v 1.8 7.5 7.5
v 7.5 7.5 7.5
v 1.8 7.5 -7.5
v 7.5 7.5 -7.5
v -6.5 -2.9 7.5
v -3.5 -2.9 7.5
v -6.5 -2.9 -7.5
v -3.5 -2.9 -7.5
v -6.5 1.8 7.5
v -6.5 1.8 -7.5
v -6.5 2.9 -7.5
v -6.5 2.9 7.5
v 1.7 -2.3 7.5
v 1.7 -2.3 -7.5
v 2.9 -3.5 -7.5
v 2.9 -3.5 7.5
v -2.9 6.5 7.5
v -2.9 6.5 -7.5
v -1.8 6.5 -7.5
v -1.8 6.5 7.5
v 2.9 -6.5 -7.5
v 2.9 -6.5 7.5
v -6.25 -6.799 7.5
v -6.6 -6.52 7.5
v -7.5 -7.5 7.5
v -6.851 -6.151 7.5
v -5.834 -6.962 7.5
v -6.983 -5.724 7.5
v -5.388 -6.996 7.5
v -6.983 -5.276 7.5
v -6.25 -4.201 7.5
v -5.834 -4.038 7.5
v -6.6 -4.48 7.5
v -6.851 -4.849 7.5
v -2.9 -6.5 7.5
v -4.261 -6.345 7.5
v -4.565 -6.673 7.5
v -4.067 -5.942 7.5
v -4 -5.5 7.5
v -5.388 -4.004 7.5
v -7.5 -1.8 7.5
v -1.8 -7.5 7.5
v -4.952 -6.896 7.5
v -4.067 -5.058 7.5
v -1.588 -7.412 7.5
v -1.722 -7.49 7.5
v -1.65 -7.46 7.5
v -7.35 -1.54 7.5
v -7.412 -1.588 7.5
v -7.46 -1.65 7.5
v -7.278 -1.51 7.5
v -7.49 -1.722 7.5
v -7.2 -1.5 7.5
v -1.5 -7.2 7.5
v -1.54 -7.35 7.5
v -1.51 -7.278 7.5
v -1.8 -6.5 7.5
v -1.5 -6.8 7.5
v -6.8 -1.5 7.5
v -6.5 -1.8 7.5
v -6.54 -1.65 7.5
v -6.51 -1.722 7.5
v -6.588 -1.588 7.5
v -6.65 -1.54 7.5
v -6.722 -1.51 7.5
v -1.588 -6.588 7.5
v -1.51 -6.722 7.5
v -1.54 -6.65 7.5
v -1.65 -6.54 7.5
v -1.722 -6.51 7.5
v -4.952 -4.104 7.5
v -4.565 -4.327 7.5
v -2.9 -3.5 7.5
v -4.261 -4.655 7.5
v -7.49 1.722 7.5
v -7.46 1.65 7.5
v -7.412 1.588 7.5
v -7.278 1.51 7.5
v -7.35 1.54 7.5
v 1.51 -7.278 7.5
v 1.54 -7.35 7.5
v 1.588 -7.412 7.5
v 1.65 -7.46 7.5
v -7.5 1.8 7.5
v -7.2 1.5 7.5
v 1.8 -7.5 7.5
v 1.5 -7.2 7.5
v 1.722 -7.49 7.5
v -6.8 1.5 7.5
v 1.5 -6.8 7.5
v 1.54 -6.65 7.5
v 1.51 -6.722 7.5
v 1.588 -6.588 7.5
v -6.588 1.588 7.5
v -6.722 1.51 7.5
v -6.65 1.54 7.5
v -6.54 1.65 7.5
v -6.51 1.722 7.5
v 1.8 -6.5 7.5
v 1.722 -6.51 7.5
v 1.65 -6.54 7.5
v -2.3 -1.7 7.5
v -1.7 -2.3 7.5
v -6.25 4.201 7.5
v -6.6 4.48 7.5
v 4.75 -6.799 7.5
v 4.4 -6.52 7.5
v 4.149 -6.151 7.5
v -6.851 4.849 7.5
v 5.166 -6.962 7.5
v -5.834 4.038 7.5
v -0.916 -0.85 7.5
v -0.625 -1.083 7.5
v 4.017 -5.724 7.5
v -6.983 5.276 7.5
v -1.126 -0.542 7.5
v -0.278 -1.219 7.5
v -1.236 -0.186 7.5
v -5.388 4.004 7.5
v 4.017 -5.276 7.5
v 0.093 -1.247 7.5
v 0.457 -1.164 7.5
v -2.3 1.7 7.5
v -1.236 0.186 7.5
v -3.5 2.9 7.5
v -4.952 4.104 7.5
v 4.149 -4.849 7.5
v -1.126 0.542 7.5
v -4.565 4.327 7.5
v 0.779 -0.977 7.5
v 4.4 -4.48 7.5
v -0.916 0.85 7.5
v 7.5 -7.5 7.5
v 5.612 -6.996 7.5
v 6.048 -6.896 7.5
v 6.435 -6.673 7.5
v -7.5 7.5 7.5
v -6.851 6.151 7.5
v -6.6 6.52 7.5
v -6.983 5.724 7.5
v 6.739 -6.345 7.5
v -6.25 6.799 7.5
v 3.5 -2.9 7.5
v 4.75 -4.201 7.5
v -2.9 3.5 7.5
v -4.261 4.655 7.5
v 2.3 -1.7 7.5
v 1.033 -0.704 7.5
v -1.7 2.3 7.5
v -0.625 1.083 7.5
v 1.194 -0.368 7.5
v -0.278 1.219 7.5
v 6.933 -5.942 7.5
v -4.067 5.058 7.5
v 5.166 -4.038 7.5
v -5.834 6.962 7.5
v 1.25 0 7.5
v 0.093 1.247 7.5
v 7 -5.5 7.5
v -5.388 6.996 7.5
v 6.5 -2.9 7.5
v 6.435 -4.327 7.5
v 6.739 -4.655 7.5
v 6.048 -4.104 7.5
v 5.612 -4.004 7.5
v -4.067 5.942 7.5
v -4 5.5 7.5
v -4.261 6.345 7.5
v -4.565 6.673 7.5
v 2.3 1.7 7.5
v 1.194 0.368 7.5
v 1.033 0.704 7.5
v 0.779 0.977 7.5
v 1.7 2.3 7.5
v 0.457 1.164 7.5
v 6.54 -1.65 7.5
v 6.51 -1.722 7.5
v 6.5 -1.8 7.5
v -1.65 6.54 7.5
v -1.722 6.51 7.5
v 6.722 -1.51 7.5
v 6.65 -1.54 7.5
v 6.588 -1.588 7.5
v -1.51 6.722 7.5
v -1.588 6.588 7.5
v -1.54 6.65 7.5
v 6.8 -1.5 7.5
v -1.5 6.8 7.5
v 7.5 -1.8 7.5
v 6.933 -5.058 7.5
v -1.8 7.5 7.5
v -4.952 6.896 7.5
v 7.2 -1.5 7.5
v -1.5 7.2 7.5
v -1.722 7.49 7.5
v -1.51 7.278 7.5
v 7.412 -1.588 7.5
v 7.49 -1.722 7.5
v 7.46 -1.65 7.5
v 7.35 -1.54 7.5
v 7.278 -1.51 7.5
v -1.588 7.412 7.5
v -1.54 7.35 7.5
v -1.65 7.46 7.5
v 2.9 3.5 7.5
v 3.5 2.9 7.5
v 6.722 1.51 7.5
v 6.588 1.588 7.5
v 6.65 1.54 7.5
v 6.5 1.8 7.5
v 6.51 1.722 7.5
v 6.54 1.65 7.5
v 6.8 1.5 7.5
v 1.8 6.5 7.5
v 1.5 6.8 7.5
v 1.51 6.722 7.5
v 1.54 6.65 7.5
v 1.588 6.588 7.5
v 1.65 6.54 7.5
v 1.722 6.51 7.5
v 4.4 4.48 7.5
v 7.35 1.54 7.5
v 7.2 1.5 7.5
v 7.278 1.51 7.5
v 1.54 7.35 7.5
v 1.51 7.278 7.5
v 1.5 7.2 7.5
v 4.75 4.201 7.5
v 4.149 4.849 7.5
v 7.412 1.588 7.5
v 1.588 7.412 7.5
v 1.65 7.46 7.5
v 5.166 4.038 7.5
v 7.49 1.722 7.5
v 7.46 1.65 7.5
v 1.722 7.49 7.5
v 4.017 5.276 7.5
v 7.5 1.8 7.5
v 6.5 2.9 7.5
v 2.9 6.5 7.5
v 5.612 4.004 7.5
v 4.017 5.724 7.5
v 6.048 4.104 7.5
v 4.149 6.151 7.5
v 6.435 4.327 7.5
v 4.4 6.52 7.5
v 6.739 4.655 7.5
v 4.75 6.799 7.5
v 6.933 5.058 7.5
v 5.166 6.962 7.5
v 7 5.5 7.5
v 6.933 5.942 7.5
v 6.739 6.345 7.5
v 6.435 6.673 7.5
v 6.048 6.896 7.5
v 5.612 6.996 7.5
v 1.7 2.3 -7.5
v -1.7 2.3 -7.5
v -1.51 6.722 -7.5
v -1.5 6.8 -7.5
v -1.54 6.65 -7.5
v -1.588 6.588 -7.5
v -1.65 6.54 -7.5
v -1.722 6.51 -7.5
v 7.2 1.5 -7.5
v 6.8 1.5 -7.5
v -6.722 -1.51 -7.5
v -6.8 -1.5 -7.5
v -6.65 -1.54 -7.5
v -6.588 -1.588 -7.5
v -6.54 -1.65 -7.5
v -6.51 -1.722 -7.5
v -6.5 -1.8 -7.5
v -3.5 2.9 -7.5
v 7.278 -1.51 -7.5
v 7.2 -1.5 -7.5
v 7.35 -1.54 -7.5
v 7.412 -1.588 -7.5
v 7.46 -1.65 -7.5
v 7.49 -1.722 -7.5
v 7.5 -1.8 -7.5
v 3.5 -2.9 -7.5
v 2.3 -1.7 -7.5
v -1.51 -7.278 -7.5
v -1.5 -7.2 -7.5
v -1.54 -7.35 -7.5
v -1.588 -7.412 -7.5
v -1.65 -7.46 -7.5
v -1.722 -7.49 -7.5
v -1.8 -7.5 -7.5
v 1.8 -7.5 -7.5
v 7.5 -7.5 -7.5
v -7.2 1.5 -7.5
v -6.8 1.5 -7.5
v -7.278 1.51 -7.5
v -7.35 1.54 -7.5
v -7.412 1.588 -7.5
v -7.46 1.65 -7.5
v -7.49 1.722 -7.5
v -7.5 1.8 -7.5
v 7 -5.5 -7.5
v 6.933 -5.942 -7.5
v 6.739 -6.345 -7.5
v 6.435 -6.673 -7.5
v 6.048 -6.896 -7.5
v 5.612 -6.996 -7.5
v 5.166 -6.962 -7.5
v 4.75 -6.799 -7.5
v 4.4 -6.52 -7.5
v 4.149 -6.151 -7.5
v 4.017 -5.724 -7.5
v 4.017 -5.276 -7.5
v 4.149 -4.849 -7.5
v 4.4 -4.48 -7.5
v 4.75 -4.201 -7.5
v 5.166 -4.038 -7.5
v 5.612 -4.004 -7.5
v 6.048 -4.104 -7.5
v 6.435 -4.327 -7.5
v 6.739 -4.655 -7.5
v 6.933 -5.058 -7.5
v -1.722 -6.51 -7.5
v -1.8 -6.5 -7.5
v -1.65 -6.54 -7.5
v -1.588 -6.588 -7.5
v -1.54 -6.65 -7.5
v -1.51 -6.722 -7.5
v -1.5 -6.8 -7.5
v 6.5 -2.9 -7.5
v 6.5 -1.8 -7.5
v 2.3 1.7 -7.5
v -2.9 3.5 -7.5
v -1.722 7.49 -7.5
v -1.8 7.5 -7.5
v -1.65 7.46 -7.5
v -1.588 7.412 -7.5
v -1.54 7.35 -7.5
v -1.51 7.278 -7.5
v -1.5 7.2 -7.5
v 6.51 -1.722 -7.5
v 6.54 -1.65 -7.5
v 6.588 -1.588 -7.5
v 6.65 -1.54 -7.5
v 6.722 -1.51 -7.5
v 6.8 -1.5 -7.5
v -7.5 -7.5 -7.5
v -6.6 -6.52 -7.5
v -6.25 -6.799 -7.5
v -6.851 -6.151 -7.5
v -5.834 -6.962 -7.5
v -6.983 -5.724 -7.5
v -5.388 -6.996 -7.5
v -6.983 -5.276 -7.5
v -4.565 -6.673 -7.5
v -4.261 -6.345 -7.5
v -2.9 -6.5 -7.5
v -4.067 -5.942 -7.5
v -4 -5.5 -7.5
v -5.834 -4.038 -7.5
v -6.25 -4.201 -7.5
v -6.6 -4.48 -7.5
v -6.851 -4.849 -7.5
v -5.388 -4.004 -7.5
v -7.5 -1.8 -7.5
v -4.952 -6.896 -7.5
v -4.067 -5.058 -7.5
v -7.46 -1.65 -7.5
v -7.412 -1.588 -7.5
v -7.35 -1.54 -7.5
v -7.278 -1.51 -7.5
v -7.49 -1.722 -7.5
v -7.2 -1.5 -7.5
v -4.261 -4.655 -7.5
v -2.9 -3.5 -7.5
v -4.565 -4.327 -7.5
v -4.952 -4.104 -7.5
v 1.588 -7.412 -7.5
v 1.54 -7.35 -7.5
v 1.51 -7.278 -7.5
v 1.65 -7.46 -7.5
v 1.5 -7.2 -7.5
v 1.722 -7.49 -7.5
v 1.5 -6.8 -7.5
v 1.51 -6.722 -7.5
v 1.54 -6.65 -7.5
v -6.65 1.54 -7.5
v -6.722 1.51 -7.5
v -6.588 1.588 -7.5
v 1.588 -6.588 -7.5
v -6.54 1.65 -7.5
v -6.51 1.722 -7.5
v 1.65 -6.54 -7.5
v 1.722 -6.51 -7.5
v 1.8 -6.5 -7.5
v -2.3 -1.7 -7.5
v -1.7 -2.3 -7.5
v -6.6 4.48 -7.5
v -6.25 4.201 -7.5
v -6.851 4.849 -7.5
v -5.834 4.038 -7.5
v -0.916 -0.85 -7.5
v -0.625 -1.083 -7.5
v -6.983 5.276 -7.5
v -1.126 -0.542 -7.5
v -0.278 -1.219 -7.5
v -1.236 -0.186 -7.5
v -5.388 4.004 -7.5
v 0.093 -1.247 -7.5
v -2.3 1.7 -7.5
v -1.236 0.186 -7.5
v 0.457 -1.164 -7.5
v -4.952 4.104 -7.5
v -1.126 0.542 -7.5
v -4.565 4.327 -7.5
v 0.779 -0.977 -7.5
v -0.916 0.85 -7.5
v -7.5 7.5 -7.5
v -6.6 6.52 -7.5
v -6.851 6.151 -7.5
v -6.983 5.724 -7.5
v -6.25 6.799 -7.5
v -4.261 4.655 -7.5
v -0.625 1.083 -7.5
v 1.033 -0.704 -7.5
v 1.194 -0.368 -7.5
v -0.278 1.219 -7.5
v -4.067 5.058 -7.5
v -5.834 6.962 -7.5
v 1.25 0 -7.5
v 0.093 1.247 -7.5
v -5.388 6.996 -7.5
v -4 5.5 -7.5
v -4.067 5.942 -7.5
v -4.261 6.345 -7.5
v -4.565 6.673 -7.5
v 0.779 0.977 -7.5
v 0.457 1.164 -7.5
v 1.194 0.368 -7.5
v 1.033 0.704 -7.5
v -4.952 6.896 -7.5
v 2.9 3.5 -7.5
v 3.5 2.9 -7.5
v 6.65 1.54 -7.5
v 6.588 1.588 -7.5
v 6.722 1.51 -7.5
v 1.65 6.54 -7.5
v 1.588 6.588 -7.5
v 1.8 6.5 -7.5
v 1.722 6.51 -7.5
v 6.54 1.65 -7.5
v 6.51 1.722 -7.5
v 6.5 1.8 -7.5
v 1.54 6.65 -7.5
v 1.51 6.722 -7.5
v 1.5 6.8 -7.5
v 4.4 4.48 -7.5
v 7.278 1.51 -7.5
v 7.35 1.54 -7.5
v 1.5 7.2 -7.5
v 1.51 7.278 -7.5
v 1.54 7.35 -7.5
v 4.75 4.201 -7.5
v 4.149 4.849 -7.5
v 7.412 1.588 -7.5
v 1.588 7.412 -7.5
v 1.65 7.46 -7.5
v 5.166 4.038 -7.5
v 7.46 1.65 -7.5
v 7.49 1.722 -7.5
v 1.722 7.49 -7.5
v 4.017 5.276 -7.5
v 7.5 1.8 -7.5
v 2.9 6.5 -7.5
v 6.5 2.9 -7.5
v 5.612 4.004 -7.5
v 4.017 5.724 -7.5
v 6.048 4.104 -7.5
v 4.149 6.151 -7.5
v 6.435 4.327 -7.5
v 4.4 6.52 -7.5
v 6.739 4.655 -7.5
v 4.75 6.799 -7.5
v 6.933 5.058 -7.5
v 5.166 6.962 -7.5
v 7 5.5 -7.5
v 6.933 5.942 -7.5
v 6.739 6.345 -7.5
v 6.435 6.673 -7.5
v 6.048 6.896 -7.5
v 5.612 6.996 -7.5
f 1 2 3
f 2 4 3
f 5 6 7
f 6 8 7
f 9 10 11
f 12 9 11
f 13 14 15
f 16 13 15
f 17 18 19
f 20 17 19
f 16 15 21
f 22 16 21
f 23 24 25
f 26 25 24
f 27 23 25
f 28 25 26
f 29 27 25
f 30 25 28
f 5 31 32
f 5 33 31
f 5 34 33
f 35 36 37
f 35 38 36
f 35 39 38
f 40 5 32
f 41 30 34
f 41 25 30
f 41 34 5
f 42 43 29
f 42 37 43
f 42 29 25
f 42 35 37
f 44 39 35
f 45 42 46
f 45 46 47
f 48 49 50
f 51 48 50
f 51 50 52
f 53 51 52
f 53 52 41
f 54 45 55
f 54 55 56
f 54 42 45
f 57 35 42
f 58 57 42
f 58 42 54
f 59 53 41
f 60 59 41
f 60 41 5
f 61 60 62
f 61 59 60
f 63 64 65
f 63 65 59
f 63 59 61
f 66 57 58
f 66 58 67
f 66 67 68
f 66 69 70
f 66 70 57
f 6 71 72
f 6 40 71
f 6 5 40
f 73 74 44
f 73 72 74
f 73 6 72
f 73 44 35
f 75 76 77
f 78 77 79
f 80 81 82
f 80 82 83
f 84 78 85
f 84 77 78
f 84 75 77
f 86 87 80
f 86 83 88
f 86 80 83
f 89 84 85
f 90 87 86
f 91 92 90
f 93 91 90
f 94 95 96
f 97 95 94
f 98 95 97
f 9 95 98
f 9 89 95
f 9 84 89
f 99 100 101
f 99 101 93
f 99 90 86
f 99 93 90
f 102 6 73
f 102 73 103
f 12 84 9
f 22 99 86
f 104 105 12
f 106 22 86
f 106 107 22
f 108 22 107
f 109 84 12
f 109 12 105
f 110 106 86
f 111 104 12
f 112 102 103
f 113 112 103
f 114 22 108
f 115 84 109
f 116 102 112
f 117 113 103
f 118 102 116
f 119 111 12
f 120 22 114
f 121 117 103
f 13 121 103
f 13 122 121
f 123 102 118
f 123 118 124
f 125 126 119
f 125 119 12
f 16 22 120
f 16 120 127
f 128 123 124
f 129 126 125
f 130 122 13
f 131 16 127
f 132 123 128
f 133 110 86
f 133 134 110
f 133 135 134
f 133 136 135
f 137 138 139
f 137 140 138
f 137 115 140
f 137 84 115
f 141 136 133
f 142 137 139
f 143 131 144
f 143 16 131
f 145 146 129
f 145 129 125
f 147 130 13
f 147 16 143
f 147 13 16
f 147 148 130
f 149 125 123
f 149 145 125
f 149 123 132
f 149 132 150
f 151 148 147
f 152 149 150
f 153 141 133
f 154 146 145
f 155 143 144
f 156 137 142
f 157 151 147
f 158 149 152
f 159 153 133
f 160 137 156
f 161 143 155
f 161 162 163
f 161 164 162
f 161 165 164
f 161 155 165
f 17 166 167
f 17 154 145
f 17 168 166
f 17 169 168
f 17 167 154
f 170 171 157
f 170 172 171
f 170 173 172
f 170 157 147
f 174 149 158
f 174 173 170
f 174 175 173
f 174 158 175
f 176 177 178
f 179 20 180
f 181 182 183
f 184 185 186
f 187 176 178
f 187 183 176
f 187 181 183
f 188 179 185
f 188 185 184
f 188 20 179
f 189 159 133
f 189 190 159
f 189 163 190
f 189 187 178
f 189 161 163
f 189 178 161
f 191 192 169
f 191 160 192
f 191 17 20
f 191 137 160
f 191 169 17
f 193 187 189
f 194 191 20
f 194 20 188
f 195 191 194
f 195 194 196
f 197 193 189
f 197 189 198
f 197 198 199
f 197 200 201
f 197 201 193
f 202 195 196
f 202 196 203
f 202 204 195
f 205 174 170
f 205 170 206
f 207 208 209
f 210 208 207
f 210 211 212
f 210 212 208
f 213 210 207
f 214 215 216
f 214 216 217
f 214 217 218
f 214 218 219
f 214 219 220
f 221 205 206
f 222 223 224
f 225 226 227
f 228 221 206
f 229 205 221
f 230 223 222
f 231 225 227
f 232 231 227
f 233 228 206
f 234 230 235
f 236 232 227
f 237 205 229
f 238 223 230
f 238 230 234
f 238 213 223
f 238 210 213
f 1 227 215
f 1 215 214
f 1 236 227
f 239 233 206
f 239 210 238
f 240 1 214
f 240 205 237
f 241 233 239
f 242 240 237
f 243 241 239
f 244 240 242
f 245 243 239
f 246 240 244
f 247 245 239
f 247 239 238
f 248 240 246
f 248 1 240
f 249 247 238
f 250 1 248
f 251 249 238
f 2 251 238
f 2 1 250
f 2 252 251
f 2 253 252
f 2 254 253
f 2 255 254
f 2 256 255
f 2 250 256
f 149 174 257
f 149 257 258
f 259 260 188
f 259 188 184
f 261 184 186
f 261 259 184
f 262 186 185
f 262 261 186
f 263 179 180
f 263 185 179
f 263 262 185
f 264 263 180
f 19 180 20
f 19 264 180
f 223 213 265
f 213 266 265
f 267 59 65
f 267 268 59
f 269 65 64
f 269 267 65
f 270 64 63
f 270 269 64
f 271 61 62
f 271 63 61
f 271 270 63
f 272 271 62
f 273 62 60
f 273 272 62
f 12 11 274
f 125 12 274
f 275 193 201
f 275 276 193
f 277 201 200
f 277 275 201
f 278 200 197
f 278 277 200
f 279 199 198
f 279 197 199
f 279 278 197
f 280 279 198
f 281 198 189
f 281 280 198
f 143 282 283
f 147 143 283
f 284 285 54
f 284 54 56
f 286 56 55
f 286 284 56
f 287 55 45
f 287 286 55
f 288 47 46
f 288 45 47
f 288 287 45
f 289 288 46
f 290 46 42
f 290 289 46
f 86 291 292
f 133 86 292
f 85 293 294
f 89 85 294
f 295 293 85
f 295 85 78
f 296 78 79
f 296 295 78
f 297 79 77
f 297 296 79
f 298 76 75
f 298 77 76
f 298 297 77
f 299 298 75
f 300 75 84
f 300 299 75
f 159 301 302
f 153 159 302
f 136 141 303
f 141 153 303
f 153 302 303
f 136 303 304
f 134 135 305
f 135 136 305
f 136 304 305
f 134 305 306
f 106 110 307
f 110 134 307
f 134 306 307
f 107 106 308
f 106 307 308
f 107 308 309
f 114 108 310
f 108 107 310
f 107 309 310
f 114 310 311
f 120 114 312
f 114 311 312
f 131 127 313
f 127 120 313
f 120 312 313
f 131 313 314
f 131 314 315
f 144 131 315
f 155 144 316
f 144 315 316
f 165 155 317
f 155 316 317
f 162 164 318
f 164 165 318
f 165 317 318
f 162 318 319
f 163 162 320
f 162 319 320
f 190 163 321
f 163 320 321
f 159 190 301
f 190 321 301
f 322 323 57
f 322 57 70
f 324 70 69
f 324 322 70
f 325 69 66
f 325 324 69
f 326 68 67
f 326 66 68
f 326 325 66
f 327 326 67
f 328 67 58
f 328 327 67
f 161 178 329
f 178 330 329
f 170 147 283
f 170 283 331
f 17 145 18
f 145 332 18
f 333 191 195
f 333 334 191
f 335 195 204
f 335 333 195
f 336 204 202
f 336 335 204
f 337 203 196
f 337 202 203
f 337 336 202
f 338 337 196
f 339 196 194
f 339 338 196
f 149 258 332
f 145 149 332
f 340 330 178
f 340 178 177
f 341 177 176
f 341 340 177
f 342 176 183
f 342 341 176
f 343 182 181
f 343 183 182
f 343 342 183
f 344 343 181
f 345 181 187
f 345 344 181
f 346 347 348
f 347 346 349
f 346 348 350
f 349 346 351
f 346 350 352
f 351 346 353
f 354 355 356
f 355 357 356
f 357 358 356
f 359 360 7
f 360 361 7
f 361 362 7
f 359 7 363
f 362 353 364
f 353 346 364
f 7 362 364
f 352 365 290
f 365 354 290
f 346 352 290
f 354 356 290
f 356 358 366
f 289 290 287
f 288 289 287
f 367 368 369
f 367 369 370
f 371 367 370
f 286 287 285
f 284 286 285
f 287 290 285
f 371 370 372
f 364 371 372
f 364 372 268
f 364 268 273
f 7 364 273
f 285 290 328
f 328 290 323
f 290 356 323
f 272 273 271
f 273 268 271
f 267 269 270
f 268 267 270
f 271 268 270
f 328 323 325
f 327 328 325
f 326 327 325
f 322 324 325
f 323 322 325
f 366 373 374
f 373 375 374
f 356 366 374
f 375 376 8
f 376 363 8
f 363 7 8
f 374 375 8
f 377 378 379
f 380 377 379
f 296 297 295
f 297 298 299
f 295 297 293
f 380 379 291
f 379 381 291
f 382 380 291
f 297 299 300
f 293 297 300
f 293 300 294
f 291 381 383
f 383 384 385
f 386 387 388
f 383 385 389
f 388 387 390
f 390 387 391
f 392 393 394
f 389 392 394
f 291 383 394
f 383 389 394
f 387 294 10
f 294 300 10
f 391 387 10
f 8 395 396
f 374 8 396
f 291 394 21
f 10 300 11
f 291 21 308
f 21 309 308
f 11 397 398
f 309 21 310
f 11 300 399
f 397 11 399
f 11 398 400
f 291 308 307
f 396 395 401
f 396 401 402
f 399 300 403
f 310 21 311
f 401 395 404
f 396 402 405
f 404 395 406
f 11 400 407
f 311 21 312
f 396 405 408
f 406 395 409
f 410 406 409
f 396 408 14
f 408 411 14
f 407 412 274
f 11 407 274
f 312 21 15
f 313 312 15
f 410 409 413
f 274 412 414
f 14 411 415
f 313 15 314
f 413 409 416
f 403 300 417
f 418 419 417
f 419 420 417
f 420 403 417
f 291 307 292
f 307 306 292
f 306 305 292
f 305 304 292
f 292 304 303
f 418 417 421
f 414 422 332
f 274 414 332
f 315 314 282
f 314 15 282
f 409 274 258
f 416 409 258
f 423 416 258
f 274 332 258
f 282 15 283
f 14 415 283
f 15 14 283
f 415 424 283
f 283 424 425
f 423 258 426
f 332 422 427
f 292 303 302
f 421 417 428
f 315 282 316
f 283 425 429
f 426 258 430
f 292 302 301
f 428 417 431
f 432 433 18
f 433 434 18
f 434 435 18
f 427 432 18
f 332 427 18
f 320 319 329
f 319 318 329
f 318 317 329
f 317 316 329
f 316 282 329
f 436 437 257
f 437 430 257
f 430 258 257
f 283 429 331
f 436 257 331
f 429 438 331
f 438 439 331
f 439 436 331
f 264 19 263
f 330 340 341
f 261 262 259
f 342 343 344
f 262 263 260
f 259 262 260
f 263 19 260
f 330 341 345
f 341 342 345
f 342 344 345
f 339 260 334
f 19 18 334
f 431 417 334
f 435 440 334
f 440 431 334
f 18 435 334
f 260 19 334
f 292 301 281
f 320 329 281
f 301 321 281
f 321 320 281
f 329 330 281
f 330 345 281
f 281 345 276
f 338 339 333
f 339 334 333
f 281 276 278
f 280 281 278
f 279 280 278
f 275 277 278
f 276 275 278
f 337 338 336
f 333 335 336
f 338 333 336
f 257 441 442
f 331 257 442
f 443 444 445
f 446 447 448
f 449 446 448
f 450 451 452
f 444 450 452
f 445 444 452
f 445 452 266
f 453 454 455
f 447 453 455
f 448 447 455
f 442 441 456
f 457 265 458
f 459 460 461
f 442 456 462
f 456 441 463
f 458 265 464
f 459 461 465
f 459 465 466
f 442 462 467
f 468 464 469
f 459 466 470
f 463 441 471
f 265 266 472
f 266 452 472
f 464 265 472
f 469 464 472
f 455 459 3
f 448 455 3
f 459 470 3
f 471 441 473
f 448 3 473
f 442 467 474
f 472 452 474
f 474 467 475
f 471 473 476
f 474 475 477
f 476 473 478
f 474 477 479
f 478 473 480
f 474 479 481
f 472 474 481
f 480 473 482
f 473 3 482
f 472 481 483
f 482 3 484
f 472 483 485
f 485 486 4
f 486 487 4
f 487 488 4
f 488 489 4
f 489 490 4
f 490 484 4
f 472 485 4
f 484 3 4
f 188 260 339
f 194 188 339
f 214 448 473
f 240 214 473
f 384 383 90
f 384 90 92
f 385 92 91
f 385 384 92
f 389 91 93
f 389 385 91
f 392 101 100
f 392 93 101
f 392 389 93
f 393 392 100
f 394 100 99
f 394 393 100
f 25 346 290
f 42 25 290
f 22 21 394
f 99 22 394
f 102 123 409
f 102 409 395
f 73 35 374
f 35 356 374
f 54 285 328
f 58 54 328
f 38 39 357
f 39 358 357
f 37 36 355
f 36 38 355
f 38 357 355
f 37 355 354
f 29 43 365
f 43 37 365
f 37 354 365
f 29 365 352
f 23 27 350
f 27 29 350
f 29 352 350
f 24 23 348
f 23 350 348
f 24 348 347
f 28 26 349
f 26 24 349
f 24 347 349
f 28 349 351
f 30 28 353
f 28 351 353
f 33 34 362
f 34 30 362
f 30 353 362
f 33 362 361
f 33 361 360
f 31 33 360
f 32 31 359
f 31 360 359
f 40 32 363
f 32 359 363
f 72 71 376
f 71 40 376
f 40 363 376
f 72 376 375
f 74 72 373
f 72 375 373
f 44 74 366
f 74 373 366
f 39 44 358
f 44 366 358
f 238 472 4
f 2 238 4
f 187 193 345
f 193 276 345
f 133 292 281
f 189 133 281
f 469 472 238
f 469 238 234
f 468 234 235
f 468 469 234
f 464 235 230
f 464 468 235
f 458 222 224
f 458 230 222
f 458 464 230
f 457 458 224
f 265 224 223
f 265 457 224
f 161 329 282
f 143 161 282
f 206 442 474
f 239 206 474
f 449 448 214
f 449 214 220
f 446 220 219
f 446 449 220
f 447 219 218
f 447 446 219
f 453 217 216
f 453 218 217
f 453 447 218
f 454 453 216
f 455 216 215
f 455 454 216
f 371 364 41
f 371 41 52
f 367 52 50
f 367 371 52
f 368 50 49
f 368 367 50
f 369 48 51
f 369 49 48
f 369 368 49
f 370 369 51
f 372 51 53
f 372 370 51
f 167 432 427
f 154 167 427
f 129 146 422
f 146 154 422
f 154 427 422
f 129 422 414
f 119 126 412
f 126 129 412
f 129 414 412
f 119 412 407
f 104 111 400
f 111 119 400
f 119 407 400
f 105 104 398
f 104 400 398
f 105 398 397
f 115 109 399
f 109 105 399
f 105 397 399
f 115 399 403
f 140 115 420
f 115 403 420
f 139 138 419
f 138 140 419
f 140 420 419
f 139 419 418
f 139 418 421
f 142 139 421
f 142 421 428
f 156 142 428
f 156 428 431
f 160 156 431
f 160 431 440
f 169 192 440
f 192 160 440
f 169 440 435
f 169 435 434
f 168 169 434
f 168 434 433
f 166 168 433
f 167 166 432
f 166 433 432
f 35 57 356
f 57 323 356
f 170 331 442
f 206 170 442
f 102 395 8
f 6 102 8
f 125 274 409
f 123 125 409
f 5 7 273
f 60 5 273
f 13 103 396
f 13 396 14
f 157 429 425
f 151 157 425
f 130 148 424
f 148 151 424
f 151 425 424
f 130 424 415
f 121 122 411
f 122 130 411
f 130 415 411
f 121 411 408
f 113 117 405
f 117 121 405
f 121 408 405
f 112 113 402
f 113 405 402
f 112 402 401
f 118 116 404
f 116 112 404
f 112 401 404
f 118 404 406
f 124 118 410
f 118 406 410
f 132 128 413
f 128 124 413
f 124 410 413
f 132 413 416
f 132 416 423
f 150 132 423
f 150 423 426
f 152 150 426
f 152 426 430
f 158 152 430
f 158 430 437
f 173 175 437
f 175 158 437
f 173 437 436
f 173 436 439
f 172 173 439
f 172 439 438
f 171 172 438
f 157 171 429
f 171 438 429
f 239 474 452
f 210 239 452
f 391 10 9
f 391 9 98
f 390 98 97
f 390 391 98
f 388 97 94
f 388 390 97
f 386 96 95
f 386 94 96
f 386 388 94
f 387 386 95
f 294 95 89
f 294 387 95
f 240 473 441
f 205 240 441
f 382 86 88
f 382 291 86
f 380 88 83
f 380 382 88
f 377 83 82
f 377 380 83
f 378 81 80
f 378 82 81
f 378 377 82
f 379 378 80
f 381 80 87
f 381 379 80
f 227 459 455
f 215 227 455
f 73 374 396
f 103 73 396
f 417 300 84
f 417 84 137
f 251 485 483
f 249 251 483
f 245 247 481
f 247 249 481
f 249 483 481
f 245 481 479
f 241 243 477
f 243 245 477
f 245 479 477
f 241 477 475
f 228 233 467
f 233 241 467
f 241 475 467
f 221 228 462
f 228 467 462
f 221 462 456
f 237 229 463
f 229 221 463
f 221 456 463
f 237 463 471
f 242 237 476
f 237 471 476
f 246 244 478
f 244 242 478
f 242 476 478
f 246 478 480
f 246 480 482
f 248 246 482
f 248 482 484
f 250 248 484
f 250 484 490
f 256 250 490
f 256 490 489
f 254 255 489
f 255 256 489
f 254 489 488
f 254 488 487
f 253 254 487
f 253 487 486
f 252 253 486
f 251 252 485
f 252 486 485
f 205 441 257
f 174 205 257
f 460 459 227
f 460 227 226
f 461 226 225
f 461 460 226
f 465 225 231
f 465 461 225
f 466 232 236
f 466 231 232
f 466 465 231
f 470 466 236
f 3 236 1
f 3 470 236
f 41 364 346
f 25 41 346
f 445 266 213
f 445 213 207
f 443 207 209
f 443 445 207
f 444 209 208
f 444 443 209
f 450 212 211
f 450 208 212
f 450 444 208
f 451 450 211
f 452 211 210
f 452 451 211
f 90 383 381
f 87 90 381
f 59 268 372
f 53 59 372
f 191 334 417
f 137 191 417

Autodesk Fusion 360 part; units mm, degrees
sketch "Cross Section" plane through (0, 0, 0) normal (0, 0, 1) x (1, 0, 0)
  line L0 (-7.5, -7.5) -> (7.5, -7.5)
  line L1 (7.5, -7.5) -> (7.5, 7.5)
  line L2 (7.5, 7.5) -> (-7.5, 7.5)
  line L3 (-7.5, -1.8) -> (-7.5, -7.5)
  line L4 (-7.5, -7.5) -> (7.5, 7.5) construction
  line L5 (7.5, -7.5) -> (-7.5, 7.5) construction
  line L6 (-7.2, 1.5) -> (-6.8, 1.5)
  line L7 (-6.5, 1.8) -> (-6.5, 2.9)
  line L8 (-6.5, 2.9) -> (-3.5, 2.9)
  line L9 (-3.5, 2.9) -> (-2.3, 1.7)
  line L10 (-2.3, 1.7) -> (-2.3, -1.7)
  line L11 (-2.3, -1.7) -> (-3.5, -2.9)
  line L12 (-3.5, -2.9) -> (-6.5, -2.9)
  line L13 (-6.5, -2.9) -> (-6.5, -1.8)
  line L14 (-6.8, -1.5) -> (-7.2, -1.5)
  line L15 (-2.3, 0) -> (-7.5, 0) construction
  circle A0 centre (0, 0) radius 1.25
  circle A1 centre (-5.5, 5.5) radius 1.5
  line L16 (-7.5, -7.5) -> (-7.5, -1.5)
  line L17 (-7.5, 1.8) -> (-7.5, 7.5)
  arc A2 (-7.5, 1.8) -> (-7.2, 1.5) centre (-7.2, 1.8) ccw
  arc A3 (-6.8, 1.5) -> (-6.5, 1.8) centre (-6.8, 1.8) ccw
  arc A4 (-6.5, -1.8) -> (-6.8, -1.5) centre (-6.8, -1.8) ccw
  arc A5 (-7.2, -1.5) -> (-7.5, -1.8) centre (-7.2, -1.8) ccw
  arc A6 (-1.8, -7.5) -> (-1.5, -7.2) centre (-1.8, -7.2) ccw
  line L18 (-1.5, -7.2) -> (-1.5, -6.8)
  line L19 (2.9, -6.5) -> (1.8, -6.5)
  arc A7 (1.8, -6.5) -> (1.5, -6.8) centre (1.8, -6.8) ccw
  line L20 (1.5, -6.8) -> (1.5, -7.2)
  arc A8 (1.5, -7.2) -> (1.8, -7.5) centre (1.8, -7.2) ccw
  line L21 (2.9, -3.5) -> (2.9, -6.5)
  line L22 (1.7, -2.3) -> (2.9, -3.5)
  line L23 (-1.7, -2.3) -> (1.7, -2.3)
  line L24 (-2.9, -3.5) -> (-1.7, -2.3)
  line L25 (-2.9, -6.5) -> (-2.9, -3.5)
  line L26 (-1.8, -6.5) -> (-2.9, -6.5)
  arc A9 (-1.5, -6.8) -> (-1.8, -6.5) centre (-1.8, -6.8) ccw
  line L27 (7.5, -7.5) -> (1.5, -7.5)
  line L28 (-1.8, -7.5) -> (-7.5, -7.5)
  circle A10 centre (-5.5, -5.5) radius 1.5
  arc A11 (7.5, -1.8) -> (7.2, -1.5) centre (7.2, -1.8) ccw
  line L29 (7.2, -1.5) -> (6.8, -1.5)
  line L30 (6.5, 2.9) -> (6.5, 1.8)
  arc A12 (6.5, 1.8) -> (6.8, 1.5) centre (6.8, 1.8) ccw
  line L31 (6.8, 1.5) -> (7.2, 1.5)
  arc A13 (7.2, 1.5) -> (7.5, 1.8) centre (7.2, 1.8) ccw
  line L32 (3.5, 2.9) -> (6.5, 2.9)
  line L33 (2.3, 1.7) -> (3.5, 2.9)
  line L34 (2.3, -1.7) -> (2.3, 1.7)
  line L35 (3.5, -2.9) -> (2.3, -1.7)
  line L36 (6.5, -2.9) -> (3.5, -2.9)
  line L37 (6.5, -1.8) -> (6.5, -2.9)
  arc A14 (6.8, -1.5) -> (6.5, -1.8) centre (6.8, -1.8) ccw
  line L38 (7.5, 7.5) -> (7.5, 1.5)
  line L39 (7.5, -1.8) -> (7.5, -7.5)
  circle A15 centre (5.5, -5.5) radius 1.5
  arc A16 (1.8, 7.5) -> (1.5, 7.2) centre (1.8, 7.2) ccw
  line L40 (1.5, 7.2) -> (1.5, 6.8)
  line L41 (-2.9, 6.5) -> (-1.8, 6.5)
  arc A17 (-1.8, 6.5) -> (-1.5, 6.8) centre (-1.8, 6.8) ccw
  line L42 (-1.5, 6.8) -> (-1.5, 7.2)
  arc A18 (-1.5, 7.2) -> (-1.8, 7.5) centre (-1.8, 7.2) ccw
  line L43 (-2.9, 3.5) -> (-2.9, 6.5)
  line L44 (-1.7, 2.3) -> (-2.9, 3.5)
  line L45 (1.7, 2.3) -> (-1.7, 2.3)
  line L46 (2.9, 3.5) -> (1.7, 2.3)
  line L47 (2.9, 6.5) -> (2.9, 3.5)
  line L48 (1.8, 6.5) -> (2.9, 6.5)
  arc A19 (1.5, 6.8) -> (1.8, 6.5) centre (1.8, 6.8) ccw
  line L49 (-7.5, 7.5) -> (-1.5, 7.5)
  line L50 (1.8, 7.5) -> (7.5, 7.5)
  circle A20 centre (5.5, 5.5) radius 1.5
  dimension "d2" = 3
  dimension "d3" = 5.2
  dimension "d4" = 5.8
  dimension "d5" = 7.5
  dimension "d6" = 1
  dimension "d7" = 135
  dimension "d8" = 3
  dimension "d9" = 7.5
  dimension "d10" = 2.5
  dimension "d11" = 3
  dimension "d12" = 2
  dimension "d47" = 15
  dimension "d50" = 0.3
  dimension "d52" = 360
extrude "Extrude1" add sketch "Cross Section" along normal mid plane 15 contours L0 L1 L2 L3 L6 L7 L8 L9 L10 L11 L12 L13 L14 L16 L17 A2 A3 A4 A5 A6 L18 L19 A7 L20 A8 L21 L22 L23 L24 L25 L26 A9 L27 L28 A11 L29 L30 A12 L31 A13 L32 L33 L34 L35 L36 L37 A14 L38 L39 A16 L40 L41 A17 L42 A18 L43 L44 L45 L46 L47 L48 A19 L49 L50
equation "Extrusion_Length = 15 mm"
equation "d20 = Extrusion_Length"
